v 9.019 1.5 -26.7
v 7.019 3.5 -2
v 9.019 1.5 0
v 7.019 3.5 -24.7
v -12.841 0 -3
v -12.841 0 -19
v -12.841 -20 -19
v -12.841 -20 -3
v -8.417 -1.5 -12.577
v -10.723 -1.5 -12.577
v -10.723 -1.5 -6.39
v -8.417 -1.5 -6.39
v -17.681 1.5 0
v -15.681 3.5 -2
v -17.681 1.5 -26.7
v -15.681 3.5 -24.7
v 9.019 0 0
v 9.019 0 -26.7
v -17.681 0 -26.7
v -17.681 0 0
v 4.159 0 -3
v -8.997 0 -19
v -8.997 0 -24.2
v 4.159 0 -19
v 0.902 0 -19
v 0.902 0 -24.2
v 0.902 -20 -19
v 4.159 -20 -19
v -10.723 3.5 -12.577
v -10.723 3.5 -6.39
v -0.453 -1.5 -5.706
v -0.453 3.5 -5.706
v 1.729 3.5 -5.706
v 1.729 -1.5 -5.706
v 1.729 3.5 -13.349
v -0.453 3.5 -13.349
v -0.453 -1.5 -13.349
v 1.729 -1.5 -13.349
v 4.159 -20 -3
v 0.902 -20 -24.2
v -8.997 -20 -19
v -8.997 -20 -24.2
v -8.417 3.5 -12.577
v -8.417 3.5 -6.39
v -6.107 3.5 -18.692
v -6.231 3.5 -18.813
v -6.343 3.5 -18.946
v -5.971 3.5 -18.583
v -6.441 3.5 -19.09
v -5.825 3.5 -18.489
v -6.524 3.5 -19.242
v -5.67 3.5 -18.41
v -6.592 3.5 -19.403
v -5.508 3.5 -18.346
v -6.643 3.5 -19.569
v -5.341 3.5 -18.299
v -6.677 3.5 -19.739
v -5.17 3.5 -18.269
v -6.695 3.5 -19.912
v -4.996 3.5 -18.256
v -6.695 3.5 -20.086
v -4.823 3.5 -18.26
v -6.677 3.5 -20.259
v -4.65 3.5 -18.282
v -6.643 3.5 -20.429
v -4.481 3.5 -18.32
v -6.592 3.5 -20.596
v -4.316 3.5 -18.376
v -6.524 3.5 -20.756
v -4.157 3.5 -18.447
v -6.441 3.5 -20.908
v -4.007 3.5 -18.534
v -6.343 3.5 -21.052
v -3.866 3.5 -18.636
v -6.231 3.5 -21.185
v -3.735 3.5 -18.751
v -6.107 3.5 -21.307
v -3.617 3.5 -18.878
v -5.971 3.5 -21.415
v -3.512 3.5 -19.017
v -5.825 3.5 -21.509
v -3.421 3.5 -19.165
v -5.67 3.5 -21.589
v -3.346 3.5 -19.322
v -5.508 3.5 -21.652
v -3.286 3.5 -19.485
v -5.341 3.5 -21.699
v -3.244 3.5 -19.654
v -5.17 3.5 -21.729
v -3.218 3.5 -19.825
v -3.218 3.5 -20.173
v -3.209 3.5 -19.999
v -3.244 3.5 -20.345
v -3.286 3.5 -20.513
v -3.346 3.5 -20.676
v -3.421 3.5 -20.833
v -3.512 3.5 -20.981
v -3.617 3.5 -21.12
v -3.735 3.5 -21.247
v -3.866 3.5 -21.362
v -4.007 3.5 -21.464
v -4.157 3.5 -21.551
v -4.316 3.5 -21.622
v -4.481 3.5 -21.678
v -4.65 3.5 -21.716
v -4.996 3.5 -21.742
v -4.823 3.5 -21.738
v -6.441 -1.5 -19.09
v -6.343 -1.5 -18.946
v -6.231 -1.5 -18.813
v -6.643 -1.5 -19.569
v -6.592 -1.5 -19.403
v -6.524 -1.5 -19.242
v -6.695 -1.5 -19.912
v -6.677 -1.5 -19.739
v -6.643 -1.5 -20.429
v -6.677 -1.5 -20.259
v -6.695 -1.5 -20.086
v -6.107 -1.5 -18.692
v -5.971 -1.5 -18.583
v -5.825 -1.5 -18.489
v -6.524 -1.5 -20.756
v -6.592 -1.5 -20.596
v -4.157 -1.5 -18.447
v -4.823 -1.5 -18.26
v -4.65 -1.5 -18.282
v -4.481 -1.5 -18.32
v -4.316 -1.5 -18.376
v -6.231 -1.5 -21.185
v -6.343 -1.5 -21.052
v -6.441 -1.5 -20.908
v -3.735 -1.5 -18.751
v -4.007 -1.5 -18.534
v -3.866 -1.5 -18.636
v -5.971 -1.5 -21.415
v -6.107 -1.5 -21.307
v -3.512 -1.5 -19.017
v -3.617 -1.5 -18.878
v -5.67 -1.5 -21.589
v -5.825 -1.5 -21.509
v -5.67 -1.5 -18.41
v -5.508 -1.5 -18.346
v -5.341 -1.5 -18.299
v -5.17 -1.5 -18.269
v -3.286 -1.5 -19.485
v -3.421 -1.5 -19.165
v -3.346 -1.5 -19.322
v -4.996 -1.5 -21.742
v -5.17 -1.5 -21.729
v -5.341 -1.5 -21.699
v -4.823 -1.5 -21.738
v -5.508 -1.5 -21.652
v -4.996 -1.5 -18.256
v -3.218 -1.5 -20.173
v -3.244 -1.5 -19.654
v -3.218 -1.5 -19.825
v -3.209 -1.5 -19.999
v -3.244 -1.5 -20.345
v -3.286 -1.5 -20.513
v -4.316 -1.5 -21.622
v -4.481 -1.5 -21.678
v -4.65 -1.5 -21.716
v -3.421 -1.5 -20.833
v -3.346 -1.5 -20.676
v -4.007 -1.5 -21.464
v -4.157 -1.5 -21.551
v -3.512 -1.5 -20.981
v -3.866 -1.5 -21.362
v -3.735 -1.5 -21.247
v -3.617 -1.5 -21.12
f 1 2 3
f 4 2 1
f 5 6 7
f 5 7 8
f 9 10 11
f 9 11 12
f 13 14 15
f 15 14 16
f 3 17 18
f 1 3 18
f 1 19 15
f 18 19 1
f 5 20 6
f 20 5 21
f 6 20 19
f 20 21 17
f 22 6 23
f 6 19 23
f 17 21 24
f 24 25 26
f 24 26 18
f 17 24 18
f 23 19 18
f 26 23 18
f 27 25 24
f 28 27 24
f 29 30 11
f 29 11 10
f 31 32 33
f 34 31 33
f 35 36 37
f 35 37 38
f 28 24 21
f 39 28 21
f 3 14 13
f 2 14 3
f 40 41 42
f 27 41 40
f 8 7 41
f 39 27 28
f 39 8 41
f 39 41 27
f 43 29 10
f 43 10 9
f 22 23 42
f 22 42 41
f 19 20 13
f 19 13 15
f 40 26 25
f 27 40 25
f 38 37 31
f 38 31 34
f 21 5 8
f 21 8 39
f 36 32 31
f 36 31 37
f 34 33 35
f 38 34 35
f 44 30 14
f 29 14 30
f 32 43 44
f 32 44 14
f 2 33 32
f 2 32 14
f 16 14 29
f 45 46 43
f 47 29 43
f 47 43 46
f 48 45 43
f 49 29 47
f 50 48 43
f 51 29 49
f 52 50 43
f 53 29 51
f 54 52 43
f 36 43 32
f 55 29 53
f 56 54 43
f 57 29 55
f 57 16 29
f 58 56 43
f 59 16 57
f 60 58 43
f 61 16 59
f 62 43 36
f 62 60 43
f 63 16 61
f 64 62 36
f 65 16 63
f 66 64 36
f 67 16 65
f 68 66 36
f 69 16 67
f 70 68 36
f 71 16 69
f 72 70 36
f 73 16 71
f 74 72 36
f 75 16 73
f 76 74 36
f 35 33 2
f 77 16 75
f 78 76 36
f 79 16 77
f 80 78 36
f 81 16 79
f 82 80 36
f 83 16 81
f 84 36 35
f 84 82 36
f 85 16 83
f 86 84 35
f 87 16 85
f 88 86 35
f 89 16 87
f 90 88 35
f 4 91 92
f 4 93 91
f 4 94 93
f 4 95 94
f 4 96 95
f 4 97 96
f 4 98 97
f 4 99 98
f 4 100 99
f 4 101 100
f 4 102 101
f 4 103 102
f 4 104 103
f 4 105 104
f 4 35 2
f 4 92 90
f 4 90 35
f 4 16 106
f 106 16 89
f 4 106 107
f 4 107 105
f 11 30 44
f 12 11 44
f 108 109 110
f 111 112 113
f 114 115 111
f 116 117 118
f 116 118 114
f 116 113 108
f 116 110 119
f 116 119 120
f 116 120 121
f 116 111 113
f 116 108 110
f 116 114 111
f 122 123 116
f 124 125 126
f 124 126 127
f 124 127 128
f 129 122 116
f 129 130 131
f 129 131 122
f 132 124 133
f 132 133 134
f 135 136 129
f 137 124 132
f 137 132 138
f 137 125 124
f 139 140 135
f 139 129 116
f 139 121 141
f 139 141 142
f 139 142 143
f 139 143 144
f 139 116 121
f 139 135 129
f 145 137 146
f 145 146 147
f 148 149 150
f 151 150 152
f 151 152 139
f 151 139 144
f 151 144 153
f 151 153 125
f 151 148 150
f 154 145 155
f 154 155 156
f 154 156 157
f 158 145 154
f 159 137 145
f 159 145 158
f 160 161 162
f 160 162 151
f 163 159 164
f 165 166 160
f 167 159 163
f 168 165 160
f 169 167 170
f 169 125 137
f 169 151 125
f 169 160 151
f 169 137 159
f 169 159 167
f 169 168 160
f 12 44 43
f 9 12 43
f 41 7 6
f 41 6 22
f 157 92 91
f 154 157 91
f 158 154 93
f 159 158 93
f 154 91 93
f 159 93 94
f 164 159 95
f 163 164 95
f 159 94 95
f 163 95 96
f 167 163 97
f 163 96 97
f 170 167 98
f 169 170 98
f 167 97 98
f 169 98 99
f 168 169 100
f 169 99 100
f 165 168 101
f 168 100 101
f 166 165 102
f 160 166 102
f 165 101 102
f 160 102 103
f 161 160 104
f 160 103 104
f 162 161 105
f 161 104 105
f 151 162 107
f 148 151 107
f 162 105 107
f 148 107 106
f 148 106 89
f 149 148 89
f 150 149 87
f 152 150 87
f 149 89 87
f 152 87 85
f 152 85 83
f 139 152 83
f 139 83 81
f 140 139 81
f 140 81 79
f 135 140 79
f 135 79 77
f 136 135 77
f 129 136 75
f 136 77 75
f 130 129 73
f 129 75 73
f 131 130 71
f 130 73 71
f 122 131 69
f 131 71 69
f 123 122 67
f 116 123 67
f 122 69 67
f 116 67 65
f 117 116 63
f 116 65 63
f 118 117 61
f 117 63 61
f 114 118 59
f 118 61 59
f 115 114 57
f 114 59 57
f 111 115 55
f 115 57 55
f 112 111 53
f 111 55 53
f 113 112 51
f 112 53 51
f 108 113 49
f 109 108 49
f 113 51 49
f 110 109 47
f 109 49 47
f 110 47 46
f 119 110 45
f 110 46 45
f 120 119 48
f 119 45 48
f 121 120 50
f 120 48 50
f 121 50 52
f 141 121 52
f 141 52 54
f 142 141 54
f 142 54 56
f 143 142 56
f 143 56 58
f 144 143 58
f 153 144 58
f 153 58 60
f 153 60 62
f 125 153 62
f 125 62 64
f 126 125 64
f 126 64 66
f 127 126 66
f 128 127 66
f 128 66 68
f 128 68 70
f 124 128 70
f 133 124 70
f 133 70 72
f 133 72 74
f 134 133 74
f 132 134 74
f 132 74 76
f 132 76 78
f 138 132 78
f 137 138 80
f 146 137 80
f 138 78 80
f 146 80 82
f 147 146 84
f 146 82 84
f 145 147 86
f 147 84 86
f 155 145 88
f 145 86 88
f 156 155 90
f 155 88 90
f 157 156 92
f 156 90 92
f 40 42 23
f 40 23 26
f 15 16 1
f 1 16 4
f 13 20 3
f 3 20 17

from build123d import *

# Parameters (mm, degrees)
SKETCH1_W           = 26.7
SKETCH1_H           = 26.7
BOSS_EXTRUDE1_DEPTH = 3.5
CHAMFER1_SIZE       = 2
SKETCH2_W           = 17
SKETCH2_H           = 16
BOSS_EXTRUDE2_DEPTH = 20
SKETCH3_W           = 9.899254973
SKETCH3_H           = 5.2
BOSS_EXTRUDE3_DEPTH = 20
SKETCH4_R           = 1.743878626
SKETCH4_W           = 2.182084489
SKETCH4_H           = 7.64251661
SKETCH4_W_2         = 2.305747791
SKETCH4_H_2         = 6.186643656
CUT_EXTRUDE1_DEPTH  = 5


with BuildPart() as part:
    # Sketch1 → Boss-Extrude1 (new body)
    with BuildSketch(Plane(origin=(0, 0, 0), x_dir=(1, 0, 0), z_dir=(0, 1, 0))):
        with Locations((-4.331476998, 13.35)):
            Rectangle(SKETCH1_W, SKETCH1_H)
    extrude(amount=BOSS_EXTRUDE1_DEPTH)

    # Chamfer1
    chamfer1_edges = [part.edges().sort_by_distance(p)[0] for p in [
        (9.018523002, 3.5, -13.35),
        (-4.331476998, 3.5, -26.7),
        (-17.681476998, 3.5, -13.35),
        (-4.331476998, 3.5, 0),
    ]]
    chamfer(chamfer1_edges, length=CHAMFER1_SIZE)

    # Sketch2 → Boss-Extrude2 (add)
    with BuildSketch(Plane.XZ):
        with Locations((-4.341476998, -11)):
            Rectangle(SKETCH2_W, SKETCH2_H)
    extrude(amount=BOSS_EXTRUDE2_DEPTH)

    # Sketch3 → Boss-Extrude3 (add)
    with BuildSketch(Plane.XZ):
        with Locations((-4.047830724, -21.6)):
            Rectangle(SKETCH3_W, SKETCH3_H)
    extrude(amount=BOSS_EXTRUDE3_DEPTH)

    # Sketch4 → Cut-Extrude1 (cut)
    with BuildSketch(Plane(origin=(0, 3.5, 0), x_dir=(1, 0, 0), z_dir=(0, 1, 0))):
        with Locations((-4.952893076, 19.999076914)):
            Circle(SKETCH4_R)
        with Locations((0.638087746, 9.527693342)):
            Rectangle(SKETCH4_W, SKETCH4_H)
        with Locations((-9.570218526, 9.483654221)):
            Rectangle(SKETCH4_W_2, SKETCH4_H_2)
    extrude(amount=-CUT_EXTRUDE1_DEPTH, mode=Mode.SUBTRACT)


solid = part.part
